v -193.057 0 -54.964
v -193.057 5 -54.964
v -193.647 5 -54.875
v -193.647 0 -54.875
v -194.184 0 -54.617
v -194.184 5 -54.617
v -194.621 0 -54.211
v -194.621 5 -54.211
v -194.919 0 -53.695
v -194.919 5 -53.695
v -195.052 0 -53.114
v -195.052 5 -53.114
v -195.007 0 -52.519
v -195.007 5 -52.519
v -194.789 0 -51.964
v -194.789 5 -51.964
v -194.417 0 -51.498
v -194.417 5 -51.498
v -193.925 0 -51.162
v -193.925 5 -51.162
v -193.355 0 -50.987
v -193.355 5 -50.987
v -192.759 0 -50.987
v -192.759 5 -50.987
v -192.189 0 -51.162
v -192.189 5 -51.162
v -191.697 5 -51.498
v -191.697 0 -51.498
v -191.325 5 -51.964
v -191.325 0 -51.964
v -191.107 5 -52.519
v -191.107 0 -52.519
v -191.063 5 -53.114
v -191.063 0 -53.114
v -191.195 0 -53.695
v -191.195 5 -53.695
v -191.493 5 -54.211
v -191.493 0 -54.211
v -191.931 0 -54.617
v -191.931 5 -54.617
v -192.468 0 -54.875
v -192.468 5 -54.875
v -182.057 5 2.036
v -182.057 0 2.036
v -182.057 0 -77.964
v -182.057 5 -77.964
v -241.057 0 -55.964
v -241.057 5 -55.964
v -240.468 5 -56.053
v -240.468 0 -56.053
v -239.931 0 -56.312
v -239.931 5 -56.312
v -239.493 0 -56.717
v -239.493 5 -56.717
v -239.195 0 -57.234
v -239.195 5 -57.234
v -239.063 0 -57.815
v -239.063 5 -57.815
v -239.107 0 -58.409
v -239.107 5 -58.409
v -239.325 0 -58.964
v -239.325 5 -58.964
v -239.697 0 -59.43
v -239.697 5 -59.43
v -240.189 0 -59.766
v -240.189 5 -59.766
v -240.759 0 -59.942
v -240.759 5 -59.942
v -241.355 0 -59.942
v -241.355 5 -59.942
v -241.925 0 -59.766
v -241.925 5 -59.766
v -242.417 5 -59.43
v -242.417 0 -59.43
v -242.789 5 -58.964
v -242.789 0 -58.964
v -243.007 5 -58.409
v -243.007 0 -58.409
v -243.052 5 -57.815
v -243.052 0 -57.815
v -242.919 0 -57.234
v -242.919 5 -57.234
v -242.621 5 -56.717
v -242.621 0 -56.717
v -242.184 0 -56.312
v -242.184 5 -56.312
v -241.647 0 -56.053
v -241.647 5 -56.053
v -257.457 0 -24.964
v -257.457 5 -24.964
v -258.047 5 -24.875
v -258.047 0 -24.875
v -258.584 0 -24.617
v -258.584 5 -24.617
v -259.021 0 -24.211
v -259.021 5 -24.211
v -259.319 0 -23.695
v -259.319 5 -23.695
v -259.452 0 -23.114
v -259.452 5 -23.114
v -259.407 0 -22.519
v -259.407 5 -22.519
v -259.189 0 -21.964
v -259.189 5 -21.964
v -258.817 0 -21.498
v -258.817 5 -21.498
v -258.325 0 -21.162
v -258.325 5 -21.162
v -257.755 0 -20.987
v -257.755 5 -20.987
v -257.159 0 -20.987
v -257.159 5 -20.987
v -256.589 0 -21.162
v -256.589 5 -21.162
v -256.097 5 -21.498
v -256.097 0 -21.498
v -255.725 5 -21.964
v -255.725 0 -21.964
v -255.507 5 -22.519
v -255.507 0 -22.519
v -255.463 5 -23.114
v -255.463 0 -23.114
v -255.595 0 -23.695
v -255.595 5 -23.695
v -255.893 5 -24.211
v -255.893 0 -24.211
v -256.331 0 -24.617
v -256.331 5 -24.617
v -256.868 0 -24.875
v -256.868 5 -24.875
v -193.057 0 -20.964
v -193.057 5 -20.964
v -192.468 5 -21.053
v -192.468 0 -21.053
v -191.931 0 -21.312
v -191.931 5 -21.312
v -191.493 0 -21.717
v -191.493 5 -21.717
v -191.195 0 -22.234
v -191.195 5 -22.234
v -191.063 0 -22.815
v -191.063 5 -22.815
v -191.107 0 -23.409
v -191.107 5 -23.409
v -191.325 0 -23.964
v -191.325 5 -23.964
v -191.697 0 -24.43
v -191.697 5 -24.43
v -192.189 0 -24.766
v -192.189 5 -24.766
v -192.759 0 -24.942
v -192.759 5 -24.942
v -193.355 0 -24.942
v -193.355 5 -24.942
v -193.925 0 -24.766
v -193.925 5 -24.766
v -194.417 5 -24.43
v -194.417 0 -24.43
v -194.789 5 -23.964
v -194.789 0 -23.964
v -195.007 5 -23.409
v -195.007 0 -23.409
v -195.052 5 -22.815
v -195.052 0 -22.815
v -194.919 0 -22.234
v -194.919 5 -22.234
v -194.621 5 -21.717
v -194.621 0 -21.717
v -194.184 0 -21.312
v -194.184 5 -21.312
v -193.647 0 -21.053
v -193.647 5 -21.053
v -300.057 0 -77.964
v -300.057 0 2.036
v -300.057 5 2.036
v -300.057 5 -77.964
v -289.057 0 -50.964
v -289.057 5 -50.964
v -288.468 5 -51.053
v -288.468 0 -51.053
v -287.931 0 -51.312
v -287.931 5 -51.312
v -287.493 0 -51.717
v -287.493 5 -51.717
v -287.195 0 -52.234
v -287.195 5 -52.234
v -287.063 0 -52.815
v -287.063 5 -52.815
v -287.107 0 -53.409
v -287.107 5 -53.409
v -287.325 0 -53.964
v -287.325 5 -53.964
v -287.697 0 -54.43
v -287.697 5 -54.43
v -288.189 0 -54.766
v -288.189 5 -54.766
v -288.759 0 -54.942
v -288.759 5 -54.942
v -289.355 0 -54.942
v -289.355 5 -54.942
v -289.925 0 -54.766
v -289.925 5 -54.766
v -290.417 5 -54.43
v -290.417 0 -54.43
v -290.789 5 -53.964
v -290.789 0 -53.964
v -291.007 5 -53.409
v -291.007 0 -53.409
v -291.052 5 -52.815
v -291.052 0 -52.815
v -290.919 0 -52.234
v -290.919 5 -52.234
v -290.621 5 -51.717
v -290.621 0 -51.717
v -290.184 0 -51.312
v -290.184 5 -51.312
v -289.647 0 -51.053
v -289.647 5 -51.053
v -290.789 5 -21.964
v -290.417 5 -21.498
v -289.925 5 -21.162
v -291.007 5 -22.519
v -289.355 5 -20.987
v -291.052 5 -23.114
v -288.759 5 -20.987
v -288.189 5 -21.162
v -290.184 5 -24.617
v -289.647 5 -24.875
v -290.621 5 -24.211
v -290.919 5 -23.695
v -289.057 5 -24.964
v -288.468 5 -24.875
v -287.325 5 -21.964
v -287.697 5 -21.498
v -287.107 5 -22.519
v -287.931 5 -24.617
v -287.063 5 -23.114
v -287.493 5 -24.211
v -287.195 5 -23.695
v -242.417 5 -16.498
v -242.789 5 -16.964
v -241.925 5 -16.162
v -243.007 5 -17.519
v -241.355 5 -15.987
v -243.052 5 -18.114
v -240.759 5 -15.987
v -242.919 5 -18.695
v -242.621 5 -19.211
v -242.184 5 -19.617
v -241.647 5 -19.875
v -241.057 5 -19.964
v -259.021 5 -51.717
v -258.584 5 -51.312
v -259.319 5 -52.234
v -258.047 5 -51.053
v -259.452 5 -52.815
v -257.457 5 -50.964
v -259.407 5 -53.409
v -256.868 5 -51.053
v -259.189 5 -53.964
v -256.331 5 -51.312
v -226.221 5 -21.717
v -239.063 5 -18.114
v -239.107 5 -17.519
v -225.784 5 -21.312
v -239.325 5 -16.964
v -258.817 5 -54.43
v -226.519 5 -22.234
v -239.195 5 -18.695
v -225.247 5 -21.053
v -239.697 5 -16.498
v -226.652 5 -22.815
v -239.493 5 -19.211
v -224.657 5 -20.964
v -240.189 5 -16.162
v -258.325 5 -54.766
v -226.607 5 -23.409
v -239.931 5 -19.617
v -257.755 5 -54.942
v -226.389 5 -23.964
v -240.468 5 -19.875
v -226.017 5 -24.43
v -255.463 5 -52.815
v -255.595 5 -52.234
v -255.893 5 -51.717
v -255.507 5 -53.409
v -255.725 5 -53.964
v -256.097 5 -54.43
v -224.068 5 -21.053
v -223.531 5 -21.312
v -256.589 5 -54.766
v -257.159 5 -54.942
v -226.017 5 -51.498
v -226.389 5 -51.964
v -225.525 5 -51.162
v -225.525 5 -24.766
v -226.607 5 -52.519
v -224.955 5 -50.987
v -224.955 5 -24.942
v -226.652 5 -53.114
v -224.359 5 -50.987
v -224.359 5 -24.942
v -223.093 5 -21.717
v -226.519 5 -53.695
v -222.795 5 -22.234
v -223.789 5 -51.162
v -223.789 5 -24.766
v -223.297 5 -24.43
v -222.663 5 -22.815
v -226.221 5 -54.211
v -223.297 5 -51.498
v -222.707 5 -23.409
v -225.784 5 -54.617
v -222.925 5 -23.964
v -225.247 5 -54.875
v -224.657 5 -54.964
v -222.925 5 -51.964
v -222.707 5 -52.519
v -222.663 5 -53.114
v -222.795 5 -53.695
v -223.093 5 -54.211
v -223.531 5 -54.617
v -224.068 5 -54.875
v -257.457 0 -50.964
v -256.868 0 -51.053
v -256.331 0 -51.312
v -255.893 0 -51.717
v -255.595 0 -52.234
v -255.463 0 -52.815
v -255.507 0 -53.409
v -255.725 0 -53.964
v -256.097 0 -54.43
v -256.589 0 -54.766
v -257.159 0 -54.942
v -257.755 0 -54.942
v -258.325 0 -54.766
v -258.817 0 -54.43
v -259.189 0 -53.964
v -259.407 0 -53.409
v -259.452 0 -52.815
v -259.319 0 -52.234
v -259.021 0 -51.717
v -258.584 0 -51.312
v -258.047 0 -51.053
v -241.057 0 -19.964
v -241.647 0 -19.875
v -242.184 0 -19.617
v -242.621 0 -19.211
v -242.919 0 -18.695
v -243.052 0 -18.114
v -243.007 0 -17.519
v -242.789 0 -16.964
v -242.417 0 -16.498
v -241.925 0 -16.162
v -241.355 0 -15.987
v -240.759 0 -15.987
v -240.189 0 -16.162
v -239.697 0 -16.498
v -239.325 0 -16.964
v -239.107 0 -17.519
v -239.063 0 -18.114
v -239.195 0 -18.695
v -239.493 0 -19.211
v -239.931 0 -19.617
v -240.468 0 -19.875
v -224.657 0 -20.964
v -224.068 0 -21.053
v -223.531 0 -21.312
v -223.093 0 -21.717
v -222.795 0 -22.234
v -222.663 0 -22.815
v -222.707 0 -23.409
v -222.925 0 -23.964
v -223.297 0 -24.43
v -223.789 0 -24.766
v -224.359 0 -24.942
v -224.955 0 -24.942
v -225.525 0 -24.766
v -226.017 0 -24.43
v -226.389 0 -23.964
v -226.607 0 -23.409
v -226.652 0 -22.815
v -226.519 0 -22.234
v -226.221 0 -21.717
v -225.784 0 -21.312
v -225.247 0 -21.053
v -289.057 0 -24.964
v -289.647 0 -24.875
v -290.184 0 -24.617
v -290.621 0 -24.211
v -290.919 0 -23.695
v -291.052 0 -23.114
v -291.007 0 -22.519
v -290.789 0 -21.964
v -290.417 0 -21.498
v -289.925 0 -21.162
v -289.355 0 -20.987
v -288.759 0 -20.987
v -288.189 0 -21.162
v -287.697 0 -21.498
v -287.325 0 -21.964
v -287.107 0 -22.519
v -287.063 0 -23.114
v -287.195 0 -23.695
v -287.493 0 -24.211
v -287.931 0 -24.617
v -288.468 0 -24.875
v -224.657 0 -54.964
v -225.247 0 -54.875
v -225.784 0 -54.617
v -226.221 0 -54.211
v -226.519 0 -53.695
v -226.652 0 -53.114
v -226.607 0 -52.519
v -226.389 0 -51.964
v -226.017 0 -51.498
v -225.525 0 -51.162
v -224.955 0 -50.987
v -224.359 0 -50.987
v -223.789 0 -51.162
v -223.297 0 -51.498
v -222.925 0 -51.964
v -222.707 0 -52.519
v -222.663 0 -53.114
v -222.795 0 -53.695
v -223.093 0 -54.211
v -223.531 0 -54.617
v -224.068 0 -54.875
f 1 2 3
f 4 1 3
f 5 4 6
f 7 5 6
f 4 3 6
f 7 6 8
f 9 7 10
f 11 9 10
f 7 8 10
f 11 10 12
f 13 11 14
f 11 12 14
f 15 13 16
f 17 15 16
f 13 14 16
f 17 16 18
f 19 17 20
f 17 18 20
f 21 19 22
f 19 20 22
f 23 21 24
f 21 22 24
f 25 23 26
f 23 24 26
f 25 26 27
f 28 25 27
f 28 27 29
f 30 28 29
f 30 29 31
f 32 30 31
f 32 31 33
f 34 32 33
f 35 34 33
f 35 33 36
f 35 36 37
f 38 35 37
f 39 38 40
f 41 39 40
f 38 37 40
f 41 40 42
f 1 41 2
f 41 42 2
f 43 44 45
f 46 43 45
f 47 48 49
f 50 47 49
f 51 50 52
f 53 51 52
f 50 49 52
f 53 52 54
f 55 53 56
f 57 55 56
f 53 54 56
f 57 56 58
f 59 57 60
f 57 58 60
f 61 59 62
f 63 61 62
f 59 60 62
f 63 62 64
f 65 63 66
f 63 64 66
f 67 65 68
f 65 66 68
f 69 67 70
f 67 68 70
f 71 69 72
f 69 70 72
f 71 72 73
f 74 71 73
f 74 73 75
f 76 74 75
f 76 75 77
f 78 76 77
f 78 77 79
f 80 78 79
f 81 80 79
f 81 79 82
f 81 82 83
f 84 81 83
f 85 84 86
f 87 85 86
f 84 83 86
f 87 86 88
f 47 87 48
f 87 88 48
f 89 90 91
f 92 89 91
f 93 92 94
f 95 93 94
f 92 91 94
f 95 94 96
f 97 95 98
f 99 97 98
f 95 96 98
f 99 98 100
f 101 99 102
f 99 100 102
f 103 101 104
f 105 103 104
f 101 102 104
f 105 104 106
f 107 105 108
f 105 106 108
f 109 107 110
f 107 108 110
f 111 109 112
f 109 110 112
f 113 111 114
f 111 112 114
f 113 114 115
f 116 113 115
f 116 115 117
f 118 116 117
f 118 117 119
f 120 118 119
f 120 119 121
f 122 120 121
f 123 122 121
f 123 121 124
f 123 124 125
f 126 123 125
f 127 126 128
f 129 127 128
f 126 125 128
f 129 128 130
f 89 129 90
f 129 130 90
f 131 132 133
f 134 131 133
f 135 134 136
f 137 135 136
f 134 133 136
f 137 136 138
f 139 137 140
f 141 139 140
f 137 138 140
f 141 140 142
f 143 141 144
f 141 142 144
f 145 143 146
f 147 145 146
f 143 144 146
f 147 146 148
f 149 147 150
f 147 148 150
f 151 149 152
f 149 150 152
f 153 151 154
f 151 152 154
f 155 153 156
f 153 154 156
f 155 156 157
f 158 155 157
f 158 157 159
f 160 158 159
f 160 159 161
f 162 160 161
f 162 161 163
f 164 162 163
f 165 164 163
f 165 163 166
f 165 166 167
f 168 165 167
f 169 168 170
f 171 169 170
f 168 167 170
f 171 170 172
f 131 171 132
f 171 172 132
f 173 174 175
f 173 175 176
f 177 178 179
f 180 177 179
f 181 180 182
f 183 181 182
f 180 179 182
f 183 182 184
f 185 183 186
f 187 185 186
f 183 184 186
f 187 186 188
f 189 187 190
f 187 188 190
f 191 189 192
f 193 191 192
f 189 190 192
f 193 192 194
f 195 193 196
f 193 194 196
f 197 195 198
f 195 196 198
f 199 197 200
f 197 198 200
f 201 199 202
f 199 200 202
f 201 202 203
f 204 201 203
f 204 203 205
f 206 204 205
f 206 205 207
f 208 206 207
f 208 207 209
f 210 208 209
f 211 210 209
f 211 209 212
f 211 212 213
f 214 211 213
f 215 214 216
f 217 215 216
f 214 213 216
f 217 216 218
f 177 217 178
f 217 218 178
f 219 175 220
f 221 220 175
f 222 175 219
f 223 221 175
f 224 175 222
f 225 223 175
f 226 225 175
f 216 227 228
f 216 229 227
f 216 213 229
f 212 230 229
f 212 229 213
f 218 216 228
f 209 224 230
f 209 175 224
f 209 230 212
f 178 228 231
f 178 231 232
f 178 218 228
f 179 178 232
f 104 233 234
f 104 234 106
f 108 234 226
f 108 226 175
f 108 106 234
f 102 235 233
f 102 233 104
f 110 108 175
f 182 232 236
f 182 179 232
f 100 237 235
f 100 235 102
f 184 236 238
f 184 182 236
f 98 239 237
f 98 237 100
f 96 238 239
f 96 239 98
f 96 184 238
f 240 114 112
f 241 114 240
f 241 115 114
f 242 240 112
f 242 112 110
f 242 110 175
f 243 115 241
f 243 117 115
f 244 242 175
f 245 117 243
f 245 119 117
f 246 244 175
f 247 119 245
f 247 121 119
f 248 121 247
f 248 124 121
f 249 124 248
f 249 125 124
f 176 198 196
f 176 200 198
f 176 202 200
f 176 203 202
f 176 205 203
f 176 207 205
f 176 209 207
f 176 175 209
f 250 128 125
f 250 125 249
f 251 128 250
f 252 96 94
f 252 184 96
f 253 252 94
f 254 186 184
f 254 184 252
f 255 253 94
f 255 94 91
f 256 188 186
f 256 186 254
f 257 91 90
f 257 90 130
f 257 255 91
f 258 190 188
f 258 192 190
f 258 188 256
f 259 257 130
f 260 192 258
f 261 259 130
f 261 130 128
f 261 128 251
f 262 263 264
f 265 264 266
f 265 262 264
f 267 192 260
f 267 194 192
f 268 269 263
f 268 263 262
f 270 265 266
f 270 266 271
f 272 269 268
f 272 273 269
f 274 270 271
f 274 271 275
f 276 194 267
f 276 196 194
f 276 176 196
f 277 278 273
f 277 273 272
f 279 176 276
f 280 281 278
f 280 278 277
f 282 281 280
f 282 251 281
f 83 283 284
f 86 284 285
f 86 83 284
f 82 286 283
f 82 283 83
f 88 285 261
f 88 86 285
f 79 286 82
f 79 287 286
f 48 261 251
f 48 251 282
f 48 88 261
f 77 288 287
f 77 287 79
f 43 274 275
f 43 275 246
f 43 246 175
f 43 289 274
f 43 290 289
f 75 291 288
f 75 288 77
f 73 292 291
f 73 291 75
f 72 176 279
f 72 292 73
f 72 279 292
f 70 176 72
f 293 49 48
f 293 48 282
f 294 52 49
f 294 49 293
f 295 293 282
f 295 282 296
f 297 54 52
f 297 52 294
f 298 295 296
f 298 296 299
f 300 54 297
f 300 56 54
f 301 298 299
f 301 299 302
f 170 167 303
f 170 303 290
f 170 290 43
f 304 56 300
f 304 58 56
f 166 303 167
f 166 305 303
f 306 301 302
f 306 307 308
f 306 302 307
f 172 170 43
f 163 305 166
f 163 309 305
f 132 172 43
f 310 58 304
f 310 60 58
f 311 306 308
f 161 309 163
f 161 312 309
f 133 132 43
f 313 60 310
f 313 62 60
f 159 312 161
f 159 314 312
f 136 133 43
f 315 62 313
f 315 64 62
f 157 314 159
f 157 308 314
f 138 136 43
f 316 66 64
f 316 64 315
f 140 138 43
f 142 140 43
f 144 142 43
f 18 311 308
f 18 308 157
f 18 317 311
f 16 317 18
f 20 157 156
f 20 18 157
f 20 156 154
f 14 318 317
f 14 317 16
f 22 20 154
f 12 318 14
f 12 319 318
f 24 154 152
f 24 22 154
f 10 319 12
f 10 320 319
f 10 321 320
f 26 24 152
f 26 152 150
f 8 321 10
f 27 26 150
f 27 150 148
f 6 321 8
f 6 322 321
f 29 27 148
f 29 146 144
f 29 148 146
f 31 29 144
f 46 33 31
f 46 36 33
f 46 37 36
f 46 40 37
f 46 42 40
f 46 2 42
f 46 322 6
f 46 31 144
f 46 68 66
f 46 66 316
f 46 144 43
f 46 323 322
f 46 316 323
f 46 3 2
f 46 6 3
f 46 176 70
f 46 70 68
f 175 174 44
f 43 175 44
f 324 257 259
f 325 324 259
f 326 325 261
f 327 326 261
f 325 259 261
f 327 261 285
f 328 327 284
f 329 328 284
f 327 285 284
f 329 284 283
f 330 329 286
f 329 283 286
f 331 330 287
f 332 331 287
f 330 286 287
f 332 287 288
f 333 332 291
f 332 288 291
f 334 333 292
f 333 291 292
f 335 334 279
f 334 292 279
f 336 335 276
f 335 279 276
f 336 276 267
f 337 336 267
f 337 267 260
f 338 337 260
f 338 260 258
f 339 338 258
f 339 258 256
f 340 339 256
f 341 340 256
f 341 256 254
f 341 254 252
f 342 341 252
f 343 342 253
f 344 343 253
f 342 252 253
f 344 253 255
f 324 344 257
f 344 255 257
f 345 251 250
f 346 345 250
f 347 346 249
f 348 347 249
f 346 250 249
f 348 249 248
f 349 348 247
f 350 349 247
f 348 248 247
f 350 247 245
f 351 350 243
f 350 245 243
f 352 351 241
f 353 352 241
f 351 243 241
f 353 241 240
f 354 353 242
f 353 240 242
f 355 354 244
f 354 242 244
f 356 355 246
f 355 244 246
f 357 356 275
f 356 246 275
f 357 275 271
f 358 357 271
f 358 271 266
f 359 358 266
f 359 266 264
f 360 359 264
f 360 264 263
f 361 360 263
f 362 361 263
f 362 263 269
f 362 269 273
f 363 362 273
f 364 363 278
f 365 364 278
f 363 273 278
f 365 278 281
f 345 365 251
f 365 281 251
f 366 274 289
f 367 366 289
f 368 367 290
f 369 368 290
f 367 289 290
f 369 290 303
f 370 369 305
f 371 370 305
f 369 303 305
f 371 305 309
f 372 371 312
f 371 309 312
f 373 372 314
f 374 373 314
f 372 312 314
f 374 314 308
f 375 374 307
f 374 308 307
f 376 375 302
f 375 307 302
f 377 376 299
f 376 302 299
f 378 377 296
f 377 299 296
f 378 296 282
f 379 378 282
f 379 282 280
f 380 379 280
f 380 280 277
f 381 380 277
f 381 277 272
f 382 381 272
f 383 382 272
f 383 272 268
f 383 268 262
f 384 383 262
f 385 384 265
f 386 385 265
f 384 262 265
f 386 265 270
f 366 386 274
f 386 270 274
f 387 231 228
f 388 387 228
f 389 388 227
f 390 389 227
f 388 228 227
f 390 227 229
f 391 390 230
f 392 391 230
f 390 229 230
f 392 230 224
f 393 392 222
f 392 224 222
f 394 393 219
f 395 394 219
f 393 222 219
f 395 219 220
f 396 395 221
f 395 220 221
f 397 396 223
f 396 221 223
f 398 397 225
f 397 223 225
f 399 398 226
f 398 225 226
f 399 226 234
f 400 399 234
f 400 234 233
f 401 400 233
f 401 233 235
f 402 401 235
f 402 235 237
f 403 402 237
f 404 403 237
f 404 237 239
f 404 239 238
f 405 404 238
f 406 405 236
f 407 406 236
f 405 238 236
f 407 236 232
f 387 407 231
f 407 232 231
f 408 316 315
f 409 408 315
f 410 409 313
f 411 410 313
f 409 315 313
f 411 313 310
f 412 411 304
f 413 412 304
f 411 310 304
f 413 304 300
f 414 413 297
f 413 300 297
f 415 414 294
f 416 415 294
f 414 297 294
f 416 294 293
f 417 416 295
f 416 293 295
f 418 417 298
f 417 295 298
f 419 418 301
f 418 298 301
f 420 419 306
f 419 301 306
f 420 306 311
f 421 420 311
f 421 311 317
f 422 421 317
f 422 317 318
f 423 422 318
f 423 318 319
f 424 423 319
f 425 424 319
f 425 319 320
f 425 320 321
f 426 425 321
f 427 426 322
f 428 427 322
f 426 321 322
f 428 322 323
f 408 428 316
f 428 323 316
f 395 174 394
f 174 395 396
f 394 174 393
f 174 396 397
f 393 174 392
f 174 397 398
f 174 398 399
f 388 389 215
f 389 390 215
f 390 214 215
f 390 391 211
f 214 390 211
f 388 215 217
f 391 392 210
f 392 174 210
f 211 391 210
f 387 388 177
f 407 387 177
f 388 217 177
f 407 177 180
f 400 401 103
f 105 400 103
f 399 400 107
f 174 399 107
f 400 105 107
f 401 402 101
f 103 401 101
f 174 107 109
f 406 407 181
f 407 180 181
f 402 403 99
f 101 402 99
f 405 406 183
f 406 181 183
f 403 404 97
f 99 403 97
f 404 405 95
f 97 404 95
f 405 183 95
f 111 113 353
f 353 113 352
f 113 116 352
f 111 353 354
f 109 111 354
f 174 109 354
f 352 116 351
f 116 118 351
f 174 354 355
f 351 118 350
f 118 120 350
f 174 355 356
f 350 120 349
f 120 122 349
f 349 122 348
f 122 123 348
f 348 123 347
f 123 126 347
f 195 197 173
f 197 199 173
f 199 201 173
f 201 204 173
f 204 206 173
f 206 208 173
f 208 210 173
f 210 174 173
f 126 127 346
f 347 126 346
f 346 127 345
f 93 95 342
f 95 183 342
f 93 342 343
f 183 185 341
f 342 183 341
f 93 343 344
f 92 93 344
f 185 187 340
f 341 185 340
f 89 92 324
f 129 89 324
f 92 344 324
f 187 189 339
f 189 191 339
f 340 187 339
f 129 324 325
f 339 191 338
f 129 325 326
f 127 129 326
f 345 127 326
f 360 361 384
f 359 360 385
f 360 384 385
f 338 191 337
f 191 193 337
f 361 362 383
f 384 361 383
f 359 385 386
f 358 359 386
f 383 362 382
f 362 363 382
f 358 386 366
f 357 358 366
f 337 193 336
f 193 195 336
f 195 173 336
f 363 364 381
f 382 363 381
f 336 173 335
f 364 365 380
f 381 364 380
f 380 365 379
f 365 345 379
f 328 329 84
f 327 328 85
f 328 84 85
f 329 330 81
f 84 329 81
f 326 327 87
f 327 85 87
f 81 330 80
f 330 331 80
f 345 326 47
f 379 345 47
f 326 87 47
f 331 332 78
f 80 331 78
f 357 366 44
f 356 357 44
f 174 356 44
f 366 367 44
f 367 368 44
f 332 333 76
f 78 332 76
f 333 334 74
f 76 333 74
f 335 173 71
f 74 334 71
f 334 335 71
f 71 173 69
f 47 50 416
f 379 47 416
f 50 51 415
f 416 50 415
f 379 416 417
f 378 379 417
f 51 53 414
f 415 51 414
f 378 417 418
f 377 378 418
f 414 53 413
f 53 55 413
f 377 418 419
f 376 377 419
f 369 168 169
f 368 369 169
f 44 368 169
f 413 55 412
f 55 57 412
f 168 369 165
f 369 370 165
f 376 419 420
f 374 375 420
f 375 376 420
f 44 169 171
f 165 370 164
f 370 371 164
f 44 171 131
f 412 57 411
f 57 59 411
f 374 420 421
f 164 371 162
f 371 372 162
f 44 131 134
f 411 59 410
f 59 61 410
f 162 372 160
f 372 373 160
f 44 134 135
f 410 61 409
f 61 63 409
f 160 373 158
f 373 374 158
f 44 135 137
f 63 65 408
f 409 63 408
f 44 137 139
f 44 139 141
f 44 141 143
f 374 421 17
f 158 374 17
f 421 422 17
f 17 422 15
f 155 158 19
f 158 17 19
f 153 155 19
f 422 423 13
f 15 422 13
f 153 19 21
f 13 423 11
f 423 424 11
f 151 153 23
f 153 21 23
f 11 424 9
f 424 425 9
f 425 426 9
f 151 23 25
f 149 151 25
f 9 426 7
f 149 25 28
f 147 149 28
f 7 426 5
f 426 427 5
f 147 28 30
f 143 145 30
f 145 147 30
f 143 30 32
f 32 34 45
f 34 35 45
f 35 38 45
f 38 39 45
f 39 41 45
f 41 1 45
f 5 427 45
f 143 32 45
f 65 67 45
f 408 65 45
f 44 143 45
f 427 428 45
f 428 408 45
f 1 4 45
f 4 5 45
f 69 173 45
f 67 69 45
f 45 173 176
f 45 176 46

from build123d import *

# Parameters (mm, degrees)
SKETCH1_W           = 118
SKETCH1_H           = 80
BOSS_EXTRUDE1_DEPTH = 5
SKETCH2_R           = 2
CUT_EXTRUDE1_DEPTH  = 5


with BuildPart() as part:
    # Sketch1 → Boss-Extrude1 (new body)
    with BuildSketch(Plane(origin=(0, 0, 0), x_dir=(1, 0, 0), z_dir=(0, 1, 0))):
        with Locations((-241.057142857, 37.964285714)):
            Rectangle(SKETCH1_W, SKETCH1_H)
    extrude(amount=BOSS_EXTRUDE1_DEPTH)

    # Sketch2 → Cut-Extrude1 (cut)
    with BuildSketch(Plane(origin=(0, 5, 0), x_dir=(1, 0, 0), z_dir=(0, 1, 0))):
        with Locations(Location((-289.057142857, 52.964285714, 0), (0, 0, 270))):
            Circle(SKETCH2_R)
        with Locations(Location((-257.457142857, 52.964285714, 0), (0, 0, 270))):
            Circle(SKETCH2_R)
        with Locations(Location((-224.657142857, 52.964285714, 0), (0, 0, 90))):
            Circle(SKETCH2_R)
        with Locations(Location((-193.057142857, 52.964285714, 0), (0, 0, 90))):
            Circle(SKETCH2_R)
        with Locations(Location((-193.057142857, 22.964285714, 0), (0, 0, 270))):
            Circle(SKETCH2_R)
        with Locations(Location((-224.657142857, 22.964285714, 0), (0, 0, 270))):
            Circle(SKETCH2_R)
        with Locations(Location((-257.457142857, 22.964285714, 0), (0, 0, 90))):
            Circle(SKETCH2_R)
        with Locations(Location((-289.057142857, 22.964285714, 0), (0, 0, 90))):
            Circle(SKETCH2_R)
        with Locations(Location((-241.057142857, 57.964285714, 0), (0, 0, 270))):
            Circle(SKETCH2_R)
        with Locations(Location((-241.057142857, 17.964285714, 0), (0, 0, 90))):
            Circle(SKETCH2_R)
    extrude(amount=-CUT_EXTRUDE1_DEPTH, mode=Mode.SUBTRACT)


solid = part.part
